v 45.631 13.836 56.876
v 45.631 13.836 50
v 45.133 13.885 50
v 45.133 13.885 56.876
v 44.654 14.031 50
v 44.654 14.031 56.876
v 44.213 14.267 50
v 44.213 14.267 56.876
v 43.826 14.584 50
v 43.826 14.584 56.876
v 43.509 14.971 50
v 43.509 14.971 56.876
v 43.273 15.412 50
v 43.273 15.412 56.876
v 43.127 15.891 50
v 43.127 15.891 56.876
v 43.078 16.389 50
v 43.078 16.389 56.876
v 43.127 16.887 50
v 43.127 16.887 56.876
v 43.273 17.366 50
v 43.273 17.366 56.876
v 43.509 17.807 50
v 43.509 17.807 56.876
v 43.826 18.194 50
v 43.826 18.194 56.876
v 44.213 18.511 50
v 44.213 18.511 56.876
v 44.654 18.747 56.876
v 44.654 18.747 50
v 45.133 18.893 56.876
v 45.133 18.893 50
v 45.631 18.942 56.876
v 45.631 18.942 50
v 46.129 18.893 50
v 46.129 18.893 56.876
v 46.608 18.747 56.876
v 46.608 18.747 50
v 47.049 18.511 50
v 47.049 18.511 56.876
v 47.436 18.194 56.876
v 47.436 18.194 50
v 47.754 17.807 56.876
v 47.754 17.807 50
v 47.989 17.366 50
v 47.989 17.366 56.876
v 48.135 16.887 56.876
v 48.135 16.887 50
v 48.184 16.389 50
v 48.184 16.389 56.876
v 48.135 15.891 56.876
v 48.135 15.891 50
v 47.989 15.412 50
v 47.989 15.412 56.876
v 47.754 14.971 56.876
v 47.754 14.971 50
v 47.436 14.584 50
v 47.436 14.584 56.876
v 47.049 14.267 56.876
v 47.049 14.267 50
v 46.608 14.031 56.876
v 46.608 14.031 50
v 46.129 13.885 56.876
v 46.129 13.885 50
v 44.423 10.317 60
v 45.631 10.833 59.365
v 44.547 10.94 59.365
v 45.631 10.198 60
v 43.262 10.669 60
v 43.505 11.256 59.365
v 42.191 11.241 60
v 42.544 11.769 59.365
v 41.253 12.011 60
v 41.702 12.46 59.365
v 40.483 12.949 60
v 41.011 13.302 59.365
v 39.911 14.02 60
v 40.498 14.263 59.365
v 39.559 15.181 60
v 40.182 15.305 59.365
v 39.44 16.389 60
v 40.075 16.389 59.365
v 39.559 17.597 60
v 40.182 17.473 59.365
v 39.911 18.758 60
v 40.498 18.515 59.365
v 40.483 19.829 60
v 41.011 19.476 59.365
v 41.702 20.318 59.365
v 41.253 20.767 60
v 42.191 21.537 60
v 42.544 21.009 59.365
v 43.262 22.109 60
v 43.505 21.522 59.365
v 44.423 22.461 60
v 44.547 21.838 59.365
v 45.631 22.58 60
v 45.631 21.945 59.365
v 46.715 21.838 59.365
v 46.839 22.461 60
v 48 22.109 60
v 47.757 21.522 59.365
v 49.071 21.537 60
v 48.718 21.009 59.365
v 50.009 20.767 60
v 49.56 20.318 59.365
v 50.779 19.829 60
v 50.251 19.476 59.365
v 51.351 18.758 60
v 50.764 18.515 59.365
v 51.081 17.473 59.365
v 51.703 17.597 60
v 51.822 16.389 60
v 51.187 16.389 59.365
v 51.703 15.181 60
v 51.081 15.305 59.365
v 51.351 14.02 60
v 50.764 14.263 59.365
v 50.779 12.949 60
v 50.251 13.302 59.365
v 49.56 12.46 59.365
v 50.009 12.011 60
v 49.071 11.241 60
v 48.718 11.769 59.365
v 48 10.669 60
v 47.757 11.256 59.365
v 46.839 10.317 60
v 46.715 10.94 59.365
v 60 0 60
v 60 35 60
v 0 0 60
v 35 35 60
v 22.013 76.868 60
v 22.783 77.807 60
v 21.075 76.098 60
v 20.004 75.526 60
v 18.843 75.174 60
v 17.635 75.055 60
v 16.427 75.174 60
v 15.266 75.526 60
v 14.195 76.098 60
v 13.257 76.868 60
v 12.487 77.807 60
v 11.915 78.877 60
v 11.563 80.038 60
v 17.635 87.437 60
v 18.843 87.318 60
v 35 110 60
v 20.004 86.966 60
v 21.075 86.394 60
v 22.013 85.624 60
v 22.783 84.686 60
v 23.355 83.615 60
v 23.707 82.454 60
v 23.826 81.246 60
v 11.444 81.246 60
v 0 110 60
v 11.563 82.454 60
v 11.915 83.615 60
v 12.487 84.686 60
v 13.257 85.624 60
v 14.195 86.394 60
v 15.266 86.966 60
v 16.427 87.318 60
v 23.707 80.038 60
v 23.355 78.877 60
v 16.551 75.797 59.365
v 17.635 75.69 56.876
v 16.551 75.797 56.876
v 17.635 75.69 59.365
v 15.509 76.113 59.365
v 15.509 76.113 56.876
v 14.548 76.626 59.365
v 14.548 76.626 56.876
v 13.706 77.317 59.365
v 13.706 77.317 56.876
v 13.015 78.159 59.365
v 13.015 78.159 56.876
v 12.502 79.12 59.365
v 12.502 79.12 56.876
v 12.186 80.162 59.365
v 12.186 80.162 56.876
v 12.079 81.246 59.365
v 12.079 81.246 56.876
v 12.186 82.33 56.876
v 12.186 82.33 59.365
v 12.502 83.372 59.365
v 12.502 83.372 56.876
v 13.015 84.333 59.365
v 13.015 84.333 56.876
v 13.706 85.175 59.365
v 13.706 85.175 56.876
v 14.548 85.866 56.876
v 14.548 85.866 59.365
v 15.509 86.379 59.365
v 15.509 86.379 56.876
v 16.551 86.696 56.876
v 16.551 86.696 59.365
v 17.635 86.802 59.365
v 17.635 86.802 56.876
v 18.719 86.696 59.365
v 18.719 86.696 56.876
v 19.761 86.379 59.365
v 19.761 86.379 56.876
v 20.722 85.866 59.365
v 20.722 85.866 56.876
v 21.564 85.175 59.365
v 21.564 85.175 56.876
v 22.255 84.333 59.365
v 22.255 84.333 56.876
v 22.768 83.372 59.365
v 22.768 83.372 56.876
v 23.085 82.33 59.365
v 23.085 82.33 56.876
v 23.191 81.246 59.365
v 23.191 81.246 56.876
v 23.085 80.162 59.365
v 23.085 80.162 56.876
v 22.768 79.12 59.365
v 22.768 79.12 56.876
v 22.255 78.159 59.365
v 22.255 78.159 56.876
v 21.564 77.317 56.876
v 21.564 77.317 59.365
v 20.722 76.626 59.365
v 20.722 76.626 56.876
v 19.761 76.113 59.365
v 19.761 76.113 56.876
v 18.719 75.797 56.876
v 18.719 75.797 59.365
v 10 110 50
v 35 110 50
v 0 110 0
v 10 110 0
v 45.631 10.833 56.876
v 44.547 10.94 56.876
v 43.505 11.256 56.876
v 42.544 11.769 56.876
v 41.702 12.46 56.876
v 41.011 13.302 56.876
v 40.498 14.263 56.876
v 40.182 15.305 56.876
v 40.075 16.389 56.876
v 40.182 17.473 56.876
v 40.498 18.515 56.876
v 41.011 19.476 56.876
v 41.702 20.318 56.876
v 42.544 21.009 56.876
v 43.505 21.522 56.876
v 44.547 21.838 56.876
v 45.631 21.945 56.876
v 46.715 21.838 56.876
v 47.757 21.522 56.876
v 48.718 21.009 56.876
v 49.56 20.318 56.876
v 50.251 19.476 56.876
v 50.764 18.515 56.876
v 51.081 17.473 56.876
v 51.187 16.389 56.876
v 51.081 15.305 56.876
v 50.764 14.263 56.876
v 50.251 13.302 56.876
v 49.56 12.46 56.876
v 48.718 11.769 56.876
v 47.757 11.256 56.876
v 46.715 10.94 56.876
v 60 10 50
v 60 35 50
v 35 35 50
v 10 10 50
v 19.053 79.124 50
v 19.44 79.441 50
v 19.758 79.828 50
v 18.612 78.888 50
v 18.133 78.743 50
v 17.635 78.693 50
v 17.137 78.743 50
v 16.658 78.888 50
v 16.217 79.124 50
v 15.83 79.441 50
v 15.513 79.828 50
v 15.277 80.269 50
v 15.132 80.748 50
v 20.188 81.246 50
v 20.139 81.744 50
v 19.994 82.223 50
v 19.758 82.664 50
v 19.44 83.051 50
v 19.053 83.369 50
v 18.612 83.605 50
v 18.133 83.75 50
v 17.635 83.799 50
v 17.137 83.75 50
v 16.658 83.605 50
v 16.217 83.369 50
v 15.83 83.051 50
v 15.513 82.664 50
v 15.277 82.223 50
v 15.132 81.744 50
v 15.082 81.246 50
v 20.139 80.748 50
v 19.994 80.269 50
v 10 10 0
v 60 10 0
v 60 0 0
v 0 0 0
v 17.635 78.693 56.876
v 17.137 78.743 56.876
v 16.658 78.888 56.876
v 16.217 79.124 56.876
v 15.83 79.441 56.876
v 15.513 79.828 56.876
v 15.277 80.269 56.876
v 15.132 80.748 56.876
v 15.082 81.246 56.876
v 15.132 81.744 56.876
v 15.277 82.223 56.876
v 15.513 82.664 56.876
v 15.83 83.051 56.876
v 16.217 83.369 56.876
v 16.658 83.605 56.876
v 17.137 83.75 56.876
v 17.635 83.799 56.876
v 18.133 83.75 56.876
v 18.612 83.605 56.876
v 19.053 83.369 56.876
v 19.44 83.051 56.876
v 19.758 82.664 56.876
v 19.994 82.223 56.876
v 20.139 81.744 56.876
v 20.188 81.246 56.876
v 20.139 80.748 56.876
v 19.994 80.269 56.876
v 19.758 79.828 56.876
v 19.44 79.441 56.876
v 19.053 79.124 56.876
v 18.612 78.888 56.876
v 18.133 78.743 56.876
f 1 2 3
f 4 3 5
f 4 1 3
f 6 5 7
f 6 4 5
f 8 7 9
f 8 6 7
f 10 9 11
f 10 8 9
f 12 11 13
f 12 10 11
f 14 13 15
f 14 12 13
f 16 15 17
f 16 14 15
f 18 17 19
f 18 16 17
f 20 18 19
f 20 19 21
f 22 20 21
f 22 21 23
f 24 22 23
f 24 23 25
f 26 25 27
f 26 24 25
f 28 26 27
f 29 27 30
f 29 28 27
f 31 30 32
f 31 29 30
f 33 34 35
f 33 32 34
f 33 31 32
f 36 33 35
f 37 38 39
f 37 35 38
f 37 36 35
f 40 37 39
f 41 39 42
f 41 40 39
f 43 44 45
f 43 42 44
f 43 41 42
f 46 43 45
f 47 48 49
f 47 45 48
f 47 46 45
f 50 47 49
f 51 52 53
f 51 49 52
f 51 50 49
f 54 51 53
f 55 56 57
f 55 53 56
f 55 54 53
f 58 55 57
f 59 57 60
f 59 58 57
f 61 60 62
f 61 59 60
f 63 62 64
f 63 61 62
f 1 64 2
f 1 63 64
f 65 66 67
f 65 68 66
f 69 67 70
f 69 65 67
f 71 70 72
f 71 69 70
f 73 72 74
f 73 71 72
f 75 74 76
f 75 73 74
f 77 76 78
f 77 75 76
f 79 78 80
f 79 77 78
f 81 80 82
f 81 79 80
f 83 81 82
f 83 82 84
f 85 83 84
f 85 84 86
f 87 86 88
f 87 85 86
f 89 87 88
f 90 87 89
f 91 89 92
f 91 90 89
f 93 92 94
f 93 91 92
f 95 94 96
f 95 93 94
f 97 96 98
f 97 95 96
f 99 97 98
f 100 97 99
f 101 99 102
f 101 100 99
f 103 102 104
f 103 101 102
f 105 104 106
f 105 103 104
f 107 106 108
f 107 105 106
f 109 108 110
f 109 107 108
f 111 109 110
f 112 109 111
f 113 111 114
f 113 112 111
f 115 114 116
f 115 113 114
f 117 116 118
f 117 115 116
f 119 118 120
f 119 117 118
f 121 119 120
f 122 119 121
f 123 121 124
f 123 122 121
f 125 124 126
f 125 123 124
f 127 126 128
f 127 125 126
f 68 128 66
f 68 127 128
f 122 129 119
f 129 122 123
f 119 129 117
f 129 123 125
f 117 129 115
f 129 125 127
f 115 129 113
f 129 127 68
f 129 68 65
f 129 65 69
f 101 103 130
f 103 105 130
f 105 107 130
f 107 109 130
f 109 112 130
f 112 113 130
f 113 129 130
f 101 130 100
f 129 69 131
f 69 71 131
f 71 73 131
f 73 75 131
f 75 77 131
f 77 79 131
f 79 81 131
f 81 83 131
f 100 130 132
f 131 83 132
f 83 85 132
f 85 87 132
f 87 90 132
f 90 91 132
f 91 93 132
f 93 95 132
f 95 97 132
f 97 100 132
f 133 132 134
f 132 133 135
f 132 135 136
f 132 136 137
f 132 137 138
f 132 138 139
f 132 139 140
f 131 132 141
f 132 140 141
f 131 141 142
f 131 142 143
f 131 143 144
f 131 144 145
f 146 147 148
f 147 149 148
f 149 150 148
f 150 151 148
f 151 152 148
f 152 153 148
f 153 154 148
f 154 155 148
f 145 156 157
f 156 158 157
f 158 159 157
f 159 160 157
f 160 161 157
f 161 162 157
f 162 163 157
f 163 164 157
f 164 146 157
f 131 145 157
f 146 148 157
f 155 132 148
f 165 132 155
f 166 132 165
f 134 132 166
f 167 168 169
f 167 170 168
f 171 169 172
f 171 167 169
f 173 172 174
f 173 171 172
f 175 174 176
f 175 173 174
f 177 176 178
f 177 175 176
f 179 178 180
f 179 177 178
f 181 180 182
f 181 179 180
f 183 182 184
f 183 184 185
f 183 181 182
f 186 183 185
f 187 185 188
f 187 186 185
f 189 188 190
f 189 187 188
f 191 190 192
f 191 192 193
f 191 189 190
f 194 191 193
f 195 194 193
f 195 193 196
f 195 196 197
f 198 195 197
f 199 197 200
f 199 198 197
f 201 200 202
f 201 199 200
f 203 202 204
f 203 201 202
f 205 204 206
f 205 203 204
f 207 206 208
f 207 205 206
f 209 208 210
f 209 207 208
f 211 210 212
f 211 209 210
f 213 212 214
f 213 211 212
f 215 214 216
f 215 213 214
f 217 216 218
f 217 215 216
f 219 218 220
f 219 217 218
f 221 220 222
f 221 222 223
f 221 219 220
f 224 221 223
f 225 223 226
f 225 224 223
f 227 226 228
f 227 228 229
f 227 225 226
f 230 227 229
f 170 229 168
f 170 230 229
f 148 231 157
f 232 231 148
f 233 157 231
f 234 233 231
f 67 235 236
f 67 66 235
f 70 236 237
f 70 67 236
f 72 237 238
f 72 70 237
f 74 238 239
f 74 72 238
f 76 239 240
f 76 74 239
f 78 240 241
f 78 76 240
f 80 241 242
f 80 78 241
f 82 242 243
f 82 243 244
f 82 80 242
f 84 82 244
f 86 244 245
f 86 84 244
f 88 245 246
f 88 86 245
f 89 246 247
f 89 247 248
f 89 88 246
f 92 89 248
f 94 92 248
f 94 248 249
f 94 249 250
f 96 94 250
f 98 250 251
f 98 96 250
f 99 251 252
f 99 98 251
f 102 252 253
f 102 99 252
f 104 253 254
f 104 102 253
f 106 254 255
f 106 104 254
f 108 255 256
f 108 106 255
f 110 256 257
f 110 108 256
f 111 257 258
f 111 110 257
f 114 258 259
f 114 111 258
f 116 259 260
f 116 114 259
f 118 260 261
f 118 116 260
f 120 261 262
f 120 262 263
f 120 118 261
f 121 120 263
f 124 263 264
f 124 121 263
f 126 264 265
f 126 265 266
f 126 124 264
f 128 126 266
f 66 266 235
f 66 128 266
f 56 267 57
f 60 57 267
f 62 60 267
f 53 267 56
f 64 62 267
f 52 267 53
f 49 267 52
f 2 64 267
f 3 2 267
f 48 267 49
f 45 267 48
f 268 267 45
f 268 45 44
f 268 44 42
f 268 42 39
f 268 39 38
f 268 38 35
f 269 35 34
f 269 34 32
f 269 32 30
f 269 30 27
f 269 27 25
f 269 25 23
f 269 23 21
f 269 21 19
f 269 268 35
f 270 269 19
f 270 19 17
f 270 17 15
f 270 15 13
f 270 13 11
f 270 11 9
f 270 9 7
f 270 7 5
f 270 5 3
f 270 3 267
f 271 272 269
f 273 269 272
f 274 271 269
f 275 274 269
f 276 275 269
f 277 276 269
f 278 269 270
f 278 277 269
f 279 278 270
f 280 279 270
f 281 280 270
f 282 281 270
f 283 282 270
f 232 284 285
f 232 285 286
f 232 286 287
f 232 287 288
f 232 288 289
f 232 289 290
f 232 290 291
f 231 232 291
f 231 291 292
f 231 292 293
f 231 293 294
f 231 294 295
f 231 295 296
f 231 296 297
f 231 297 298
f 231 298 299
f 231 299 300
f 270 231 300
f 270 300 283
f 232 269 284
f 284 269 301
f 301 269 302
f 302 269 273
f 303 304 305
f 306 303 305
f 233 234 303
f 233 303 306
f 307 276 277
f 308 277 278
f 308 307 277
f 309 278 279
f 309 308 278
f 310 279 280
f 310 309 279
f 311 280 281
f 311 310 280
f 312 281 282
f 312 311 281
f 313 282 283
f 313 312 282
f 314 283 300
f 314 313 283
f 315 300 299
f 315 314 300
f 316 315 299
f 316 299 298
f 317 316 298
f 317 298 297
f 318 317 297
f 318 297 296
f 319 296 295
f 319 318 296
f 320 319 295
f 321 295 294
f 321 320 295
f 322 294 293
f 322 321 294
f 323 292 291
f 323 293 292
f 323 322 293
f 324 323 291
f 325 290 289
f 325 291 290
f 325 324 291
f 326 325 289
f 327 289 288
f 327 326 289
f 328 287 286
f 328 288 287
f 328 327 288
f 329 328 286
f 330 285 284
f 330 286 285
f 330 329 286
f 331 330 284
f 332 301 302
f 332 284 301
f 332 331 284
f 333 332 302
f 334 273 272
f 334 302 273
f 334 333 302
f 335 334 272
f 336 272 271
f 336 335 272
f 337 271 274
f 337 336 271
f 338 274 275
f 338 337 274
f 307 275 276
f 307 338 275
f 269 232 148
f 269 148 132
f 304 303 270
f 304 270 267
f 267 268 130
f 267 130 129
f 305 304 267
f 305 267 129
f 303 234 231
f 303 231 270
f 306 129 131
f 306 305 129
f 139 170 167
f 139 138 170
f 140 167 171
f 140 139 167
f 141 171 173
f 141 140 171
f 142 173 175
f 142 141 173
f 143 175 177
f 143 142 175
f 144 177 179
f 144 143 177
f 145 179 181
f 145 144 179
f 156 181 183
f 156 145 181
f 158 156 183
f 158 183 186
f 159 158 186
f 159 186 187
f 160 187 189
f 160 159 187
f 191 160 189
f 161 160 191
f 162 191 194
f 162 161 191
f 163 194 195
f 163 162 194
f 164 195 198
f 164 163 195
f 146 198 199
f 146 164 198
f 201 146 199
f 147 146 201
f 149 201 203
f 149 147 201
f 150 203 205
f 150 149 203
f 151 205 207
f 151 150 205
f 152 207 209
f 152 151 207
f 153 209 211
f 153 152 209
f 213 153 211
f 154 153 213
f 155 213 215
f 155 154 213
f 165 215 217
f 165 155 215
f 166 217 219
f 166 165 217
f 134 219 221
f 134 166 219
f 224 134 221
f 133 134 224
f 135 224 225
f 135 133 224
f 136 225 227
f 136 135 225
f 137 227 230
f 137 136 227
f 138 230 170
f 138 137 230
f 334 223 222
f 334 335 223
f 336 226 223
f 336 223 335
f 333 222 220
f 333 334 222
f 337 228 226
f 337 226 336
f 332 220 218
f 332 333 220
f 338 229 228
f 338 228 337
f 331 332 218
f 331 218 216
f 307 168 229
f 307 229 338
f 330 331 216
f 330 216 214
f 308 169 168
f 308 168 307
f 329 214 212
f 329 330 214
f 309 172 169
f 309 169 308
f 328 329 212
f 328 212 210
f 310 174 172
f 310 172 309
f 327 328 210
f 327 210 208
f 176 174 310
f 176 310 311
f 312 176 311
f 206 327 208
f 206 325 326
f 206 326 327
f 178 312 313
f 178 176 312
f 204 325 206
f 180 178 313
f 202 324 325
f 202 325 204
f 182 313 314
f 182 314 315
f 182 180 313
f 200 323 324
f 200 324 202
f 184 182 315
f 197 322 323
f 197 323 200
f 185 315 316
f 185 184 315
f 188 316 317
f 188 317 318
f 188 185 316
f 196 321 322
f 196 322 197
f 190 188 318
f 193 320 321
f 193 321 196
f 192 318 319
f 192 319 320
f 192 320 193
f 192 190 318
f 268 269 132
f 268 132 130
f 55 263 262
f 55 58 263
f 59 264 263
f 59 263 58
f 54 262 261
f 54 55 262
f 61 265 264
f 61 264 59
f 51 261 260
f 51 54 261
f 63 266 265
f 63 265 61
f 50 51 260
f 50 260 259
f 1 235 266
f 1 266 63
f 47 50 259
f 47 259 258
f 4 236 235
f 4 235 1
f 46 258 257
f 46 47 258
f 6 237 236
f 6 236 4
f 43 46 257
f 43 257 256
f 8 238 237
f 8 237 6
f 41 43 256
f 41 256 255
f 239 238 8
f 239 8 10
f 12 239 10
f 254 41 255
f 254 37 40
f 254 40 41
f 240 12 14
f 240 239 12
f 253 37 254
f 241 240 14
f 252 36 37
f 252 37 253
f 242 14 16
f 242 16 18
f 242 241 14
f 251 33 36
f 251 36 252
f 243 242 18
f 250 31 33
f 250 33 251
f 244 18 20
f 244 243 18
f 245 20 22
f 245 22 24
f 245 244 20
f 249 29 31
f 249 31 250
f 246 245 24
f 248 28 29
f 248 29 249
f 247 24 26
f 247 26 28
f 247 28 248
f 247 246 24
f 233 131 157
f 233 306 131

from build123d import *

# Parameters (mm, degrees)
BOSS_EXTRUDE1_DEPTH                         = 50
BOSS_EXTRUDE2_DEPTH                         = 10
CBORE_FOR_10_BINDING_HEAD_MACHINE_S_2_COUNT = 2
CBORE_FOR_10_BINDING_HEAD_MACHINE_S_2_PITCH = 70.641523205


with BuildPart() as part:
    # Sketch1 → Boss-Extrude1 (new body)
    with BuildSketch(Plane.XY):
        Polygon((0, 110), (10, 110), (10, 10), (60, 10), (60, 0), (0, 0), align=None)
    extrude(amount=BOSS_EXTRUDE1_DEPTH)

    # Sketch2 → Boss-Extrude2 (add)
    with BuildSketch(Plane.XY.offset(50)):
        Polygon((0, 110), (35, 110), (35, 35), (60, 35), (60, 0), (0, 0), align=None)
    extrude(amount=BOSS_EXTRUDE2_DEPTH)

    # Sketch3 → CBORE for #10 Binding Head Machine Screw1 (revolve, cut)
    with BuildSketch(Plane(origin=(17.635166565, 81.246186772, 60), x_dir=(0, -1, 0), z_dir=(1, 0, 0))):
        Polygon((0, 0), (0, 60.000025), (2.5527, 60.000025), (2.5527, 3.1242), (5.55625, 3.1242), (5.55625, 0.635), (6.19125, 0), align=None)
    cbore_for_10_binding_head_machine_screw = revolve(axis=Axis((17.635166565, 81.246186772, 66.35), (0, 0, -1)), mode=Mode.SUBTRACT)

    # CBORE for _10 Binding Head Machine S 2: CBORE for #10 Binding Head Machine Screw1 ×2
    with Locations(*[Vector(0.396309487955917, -0.9181169804312079, 0) * (i * CBORE_FOR_10_BINDING_HEAD_MACHINE_S_2_PITCH) for i in range(1, CBORE_FOR_10_BINDING_HEAD_MACHINE_S_2_COUNT)]):
        add(cbore_for_10_binding_head_machine_screw, mode=Mode.SUBTRACT)


solid = part.part
